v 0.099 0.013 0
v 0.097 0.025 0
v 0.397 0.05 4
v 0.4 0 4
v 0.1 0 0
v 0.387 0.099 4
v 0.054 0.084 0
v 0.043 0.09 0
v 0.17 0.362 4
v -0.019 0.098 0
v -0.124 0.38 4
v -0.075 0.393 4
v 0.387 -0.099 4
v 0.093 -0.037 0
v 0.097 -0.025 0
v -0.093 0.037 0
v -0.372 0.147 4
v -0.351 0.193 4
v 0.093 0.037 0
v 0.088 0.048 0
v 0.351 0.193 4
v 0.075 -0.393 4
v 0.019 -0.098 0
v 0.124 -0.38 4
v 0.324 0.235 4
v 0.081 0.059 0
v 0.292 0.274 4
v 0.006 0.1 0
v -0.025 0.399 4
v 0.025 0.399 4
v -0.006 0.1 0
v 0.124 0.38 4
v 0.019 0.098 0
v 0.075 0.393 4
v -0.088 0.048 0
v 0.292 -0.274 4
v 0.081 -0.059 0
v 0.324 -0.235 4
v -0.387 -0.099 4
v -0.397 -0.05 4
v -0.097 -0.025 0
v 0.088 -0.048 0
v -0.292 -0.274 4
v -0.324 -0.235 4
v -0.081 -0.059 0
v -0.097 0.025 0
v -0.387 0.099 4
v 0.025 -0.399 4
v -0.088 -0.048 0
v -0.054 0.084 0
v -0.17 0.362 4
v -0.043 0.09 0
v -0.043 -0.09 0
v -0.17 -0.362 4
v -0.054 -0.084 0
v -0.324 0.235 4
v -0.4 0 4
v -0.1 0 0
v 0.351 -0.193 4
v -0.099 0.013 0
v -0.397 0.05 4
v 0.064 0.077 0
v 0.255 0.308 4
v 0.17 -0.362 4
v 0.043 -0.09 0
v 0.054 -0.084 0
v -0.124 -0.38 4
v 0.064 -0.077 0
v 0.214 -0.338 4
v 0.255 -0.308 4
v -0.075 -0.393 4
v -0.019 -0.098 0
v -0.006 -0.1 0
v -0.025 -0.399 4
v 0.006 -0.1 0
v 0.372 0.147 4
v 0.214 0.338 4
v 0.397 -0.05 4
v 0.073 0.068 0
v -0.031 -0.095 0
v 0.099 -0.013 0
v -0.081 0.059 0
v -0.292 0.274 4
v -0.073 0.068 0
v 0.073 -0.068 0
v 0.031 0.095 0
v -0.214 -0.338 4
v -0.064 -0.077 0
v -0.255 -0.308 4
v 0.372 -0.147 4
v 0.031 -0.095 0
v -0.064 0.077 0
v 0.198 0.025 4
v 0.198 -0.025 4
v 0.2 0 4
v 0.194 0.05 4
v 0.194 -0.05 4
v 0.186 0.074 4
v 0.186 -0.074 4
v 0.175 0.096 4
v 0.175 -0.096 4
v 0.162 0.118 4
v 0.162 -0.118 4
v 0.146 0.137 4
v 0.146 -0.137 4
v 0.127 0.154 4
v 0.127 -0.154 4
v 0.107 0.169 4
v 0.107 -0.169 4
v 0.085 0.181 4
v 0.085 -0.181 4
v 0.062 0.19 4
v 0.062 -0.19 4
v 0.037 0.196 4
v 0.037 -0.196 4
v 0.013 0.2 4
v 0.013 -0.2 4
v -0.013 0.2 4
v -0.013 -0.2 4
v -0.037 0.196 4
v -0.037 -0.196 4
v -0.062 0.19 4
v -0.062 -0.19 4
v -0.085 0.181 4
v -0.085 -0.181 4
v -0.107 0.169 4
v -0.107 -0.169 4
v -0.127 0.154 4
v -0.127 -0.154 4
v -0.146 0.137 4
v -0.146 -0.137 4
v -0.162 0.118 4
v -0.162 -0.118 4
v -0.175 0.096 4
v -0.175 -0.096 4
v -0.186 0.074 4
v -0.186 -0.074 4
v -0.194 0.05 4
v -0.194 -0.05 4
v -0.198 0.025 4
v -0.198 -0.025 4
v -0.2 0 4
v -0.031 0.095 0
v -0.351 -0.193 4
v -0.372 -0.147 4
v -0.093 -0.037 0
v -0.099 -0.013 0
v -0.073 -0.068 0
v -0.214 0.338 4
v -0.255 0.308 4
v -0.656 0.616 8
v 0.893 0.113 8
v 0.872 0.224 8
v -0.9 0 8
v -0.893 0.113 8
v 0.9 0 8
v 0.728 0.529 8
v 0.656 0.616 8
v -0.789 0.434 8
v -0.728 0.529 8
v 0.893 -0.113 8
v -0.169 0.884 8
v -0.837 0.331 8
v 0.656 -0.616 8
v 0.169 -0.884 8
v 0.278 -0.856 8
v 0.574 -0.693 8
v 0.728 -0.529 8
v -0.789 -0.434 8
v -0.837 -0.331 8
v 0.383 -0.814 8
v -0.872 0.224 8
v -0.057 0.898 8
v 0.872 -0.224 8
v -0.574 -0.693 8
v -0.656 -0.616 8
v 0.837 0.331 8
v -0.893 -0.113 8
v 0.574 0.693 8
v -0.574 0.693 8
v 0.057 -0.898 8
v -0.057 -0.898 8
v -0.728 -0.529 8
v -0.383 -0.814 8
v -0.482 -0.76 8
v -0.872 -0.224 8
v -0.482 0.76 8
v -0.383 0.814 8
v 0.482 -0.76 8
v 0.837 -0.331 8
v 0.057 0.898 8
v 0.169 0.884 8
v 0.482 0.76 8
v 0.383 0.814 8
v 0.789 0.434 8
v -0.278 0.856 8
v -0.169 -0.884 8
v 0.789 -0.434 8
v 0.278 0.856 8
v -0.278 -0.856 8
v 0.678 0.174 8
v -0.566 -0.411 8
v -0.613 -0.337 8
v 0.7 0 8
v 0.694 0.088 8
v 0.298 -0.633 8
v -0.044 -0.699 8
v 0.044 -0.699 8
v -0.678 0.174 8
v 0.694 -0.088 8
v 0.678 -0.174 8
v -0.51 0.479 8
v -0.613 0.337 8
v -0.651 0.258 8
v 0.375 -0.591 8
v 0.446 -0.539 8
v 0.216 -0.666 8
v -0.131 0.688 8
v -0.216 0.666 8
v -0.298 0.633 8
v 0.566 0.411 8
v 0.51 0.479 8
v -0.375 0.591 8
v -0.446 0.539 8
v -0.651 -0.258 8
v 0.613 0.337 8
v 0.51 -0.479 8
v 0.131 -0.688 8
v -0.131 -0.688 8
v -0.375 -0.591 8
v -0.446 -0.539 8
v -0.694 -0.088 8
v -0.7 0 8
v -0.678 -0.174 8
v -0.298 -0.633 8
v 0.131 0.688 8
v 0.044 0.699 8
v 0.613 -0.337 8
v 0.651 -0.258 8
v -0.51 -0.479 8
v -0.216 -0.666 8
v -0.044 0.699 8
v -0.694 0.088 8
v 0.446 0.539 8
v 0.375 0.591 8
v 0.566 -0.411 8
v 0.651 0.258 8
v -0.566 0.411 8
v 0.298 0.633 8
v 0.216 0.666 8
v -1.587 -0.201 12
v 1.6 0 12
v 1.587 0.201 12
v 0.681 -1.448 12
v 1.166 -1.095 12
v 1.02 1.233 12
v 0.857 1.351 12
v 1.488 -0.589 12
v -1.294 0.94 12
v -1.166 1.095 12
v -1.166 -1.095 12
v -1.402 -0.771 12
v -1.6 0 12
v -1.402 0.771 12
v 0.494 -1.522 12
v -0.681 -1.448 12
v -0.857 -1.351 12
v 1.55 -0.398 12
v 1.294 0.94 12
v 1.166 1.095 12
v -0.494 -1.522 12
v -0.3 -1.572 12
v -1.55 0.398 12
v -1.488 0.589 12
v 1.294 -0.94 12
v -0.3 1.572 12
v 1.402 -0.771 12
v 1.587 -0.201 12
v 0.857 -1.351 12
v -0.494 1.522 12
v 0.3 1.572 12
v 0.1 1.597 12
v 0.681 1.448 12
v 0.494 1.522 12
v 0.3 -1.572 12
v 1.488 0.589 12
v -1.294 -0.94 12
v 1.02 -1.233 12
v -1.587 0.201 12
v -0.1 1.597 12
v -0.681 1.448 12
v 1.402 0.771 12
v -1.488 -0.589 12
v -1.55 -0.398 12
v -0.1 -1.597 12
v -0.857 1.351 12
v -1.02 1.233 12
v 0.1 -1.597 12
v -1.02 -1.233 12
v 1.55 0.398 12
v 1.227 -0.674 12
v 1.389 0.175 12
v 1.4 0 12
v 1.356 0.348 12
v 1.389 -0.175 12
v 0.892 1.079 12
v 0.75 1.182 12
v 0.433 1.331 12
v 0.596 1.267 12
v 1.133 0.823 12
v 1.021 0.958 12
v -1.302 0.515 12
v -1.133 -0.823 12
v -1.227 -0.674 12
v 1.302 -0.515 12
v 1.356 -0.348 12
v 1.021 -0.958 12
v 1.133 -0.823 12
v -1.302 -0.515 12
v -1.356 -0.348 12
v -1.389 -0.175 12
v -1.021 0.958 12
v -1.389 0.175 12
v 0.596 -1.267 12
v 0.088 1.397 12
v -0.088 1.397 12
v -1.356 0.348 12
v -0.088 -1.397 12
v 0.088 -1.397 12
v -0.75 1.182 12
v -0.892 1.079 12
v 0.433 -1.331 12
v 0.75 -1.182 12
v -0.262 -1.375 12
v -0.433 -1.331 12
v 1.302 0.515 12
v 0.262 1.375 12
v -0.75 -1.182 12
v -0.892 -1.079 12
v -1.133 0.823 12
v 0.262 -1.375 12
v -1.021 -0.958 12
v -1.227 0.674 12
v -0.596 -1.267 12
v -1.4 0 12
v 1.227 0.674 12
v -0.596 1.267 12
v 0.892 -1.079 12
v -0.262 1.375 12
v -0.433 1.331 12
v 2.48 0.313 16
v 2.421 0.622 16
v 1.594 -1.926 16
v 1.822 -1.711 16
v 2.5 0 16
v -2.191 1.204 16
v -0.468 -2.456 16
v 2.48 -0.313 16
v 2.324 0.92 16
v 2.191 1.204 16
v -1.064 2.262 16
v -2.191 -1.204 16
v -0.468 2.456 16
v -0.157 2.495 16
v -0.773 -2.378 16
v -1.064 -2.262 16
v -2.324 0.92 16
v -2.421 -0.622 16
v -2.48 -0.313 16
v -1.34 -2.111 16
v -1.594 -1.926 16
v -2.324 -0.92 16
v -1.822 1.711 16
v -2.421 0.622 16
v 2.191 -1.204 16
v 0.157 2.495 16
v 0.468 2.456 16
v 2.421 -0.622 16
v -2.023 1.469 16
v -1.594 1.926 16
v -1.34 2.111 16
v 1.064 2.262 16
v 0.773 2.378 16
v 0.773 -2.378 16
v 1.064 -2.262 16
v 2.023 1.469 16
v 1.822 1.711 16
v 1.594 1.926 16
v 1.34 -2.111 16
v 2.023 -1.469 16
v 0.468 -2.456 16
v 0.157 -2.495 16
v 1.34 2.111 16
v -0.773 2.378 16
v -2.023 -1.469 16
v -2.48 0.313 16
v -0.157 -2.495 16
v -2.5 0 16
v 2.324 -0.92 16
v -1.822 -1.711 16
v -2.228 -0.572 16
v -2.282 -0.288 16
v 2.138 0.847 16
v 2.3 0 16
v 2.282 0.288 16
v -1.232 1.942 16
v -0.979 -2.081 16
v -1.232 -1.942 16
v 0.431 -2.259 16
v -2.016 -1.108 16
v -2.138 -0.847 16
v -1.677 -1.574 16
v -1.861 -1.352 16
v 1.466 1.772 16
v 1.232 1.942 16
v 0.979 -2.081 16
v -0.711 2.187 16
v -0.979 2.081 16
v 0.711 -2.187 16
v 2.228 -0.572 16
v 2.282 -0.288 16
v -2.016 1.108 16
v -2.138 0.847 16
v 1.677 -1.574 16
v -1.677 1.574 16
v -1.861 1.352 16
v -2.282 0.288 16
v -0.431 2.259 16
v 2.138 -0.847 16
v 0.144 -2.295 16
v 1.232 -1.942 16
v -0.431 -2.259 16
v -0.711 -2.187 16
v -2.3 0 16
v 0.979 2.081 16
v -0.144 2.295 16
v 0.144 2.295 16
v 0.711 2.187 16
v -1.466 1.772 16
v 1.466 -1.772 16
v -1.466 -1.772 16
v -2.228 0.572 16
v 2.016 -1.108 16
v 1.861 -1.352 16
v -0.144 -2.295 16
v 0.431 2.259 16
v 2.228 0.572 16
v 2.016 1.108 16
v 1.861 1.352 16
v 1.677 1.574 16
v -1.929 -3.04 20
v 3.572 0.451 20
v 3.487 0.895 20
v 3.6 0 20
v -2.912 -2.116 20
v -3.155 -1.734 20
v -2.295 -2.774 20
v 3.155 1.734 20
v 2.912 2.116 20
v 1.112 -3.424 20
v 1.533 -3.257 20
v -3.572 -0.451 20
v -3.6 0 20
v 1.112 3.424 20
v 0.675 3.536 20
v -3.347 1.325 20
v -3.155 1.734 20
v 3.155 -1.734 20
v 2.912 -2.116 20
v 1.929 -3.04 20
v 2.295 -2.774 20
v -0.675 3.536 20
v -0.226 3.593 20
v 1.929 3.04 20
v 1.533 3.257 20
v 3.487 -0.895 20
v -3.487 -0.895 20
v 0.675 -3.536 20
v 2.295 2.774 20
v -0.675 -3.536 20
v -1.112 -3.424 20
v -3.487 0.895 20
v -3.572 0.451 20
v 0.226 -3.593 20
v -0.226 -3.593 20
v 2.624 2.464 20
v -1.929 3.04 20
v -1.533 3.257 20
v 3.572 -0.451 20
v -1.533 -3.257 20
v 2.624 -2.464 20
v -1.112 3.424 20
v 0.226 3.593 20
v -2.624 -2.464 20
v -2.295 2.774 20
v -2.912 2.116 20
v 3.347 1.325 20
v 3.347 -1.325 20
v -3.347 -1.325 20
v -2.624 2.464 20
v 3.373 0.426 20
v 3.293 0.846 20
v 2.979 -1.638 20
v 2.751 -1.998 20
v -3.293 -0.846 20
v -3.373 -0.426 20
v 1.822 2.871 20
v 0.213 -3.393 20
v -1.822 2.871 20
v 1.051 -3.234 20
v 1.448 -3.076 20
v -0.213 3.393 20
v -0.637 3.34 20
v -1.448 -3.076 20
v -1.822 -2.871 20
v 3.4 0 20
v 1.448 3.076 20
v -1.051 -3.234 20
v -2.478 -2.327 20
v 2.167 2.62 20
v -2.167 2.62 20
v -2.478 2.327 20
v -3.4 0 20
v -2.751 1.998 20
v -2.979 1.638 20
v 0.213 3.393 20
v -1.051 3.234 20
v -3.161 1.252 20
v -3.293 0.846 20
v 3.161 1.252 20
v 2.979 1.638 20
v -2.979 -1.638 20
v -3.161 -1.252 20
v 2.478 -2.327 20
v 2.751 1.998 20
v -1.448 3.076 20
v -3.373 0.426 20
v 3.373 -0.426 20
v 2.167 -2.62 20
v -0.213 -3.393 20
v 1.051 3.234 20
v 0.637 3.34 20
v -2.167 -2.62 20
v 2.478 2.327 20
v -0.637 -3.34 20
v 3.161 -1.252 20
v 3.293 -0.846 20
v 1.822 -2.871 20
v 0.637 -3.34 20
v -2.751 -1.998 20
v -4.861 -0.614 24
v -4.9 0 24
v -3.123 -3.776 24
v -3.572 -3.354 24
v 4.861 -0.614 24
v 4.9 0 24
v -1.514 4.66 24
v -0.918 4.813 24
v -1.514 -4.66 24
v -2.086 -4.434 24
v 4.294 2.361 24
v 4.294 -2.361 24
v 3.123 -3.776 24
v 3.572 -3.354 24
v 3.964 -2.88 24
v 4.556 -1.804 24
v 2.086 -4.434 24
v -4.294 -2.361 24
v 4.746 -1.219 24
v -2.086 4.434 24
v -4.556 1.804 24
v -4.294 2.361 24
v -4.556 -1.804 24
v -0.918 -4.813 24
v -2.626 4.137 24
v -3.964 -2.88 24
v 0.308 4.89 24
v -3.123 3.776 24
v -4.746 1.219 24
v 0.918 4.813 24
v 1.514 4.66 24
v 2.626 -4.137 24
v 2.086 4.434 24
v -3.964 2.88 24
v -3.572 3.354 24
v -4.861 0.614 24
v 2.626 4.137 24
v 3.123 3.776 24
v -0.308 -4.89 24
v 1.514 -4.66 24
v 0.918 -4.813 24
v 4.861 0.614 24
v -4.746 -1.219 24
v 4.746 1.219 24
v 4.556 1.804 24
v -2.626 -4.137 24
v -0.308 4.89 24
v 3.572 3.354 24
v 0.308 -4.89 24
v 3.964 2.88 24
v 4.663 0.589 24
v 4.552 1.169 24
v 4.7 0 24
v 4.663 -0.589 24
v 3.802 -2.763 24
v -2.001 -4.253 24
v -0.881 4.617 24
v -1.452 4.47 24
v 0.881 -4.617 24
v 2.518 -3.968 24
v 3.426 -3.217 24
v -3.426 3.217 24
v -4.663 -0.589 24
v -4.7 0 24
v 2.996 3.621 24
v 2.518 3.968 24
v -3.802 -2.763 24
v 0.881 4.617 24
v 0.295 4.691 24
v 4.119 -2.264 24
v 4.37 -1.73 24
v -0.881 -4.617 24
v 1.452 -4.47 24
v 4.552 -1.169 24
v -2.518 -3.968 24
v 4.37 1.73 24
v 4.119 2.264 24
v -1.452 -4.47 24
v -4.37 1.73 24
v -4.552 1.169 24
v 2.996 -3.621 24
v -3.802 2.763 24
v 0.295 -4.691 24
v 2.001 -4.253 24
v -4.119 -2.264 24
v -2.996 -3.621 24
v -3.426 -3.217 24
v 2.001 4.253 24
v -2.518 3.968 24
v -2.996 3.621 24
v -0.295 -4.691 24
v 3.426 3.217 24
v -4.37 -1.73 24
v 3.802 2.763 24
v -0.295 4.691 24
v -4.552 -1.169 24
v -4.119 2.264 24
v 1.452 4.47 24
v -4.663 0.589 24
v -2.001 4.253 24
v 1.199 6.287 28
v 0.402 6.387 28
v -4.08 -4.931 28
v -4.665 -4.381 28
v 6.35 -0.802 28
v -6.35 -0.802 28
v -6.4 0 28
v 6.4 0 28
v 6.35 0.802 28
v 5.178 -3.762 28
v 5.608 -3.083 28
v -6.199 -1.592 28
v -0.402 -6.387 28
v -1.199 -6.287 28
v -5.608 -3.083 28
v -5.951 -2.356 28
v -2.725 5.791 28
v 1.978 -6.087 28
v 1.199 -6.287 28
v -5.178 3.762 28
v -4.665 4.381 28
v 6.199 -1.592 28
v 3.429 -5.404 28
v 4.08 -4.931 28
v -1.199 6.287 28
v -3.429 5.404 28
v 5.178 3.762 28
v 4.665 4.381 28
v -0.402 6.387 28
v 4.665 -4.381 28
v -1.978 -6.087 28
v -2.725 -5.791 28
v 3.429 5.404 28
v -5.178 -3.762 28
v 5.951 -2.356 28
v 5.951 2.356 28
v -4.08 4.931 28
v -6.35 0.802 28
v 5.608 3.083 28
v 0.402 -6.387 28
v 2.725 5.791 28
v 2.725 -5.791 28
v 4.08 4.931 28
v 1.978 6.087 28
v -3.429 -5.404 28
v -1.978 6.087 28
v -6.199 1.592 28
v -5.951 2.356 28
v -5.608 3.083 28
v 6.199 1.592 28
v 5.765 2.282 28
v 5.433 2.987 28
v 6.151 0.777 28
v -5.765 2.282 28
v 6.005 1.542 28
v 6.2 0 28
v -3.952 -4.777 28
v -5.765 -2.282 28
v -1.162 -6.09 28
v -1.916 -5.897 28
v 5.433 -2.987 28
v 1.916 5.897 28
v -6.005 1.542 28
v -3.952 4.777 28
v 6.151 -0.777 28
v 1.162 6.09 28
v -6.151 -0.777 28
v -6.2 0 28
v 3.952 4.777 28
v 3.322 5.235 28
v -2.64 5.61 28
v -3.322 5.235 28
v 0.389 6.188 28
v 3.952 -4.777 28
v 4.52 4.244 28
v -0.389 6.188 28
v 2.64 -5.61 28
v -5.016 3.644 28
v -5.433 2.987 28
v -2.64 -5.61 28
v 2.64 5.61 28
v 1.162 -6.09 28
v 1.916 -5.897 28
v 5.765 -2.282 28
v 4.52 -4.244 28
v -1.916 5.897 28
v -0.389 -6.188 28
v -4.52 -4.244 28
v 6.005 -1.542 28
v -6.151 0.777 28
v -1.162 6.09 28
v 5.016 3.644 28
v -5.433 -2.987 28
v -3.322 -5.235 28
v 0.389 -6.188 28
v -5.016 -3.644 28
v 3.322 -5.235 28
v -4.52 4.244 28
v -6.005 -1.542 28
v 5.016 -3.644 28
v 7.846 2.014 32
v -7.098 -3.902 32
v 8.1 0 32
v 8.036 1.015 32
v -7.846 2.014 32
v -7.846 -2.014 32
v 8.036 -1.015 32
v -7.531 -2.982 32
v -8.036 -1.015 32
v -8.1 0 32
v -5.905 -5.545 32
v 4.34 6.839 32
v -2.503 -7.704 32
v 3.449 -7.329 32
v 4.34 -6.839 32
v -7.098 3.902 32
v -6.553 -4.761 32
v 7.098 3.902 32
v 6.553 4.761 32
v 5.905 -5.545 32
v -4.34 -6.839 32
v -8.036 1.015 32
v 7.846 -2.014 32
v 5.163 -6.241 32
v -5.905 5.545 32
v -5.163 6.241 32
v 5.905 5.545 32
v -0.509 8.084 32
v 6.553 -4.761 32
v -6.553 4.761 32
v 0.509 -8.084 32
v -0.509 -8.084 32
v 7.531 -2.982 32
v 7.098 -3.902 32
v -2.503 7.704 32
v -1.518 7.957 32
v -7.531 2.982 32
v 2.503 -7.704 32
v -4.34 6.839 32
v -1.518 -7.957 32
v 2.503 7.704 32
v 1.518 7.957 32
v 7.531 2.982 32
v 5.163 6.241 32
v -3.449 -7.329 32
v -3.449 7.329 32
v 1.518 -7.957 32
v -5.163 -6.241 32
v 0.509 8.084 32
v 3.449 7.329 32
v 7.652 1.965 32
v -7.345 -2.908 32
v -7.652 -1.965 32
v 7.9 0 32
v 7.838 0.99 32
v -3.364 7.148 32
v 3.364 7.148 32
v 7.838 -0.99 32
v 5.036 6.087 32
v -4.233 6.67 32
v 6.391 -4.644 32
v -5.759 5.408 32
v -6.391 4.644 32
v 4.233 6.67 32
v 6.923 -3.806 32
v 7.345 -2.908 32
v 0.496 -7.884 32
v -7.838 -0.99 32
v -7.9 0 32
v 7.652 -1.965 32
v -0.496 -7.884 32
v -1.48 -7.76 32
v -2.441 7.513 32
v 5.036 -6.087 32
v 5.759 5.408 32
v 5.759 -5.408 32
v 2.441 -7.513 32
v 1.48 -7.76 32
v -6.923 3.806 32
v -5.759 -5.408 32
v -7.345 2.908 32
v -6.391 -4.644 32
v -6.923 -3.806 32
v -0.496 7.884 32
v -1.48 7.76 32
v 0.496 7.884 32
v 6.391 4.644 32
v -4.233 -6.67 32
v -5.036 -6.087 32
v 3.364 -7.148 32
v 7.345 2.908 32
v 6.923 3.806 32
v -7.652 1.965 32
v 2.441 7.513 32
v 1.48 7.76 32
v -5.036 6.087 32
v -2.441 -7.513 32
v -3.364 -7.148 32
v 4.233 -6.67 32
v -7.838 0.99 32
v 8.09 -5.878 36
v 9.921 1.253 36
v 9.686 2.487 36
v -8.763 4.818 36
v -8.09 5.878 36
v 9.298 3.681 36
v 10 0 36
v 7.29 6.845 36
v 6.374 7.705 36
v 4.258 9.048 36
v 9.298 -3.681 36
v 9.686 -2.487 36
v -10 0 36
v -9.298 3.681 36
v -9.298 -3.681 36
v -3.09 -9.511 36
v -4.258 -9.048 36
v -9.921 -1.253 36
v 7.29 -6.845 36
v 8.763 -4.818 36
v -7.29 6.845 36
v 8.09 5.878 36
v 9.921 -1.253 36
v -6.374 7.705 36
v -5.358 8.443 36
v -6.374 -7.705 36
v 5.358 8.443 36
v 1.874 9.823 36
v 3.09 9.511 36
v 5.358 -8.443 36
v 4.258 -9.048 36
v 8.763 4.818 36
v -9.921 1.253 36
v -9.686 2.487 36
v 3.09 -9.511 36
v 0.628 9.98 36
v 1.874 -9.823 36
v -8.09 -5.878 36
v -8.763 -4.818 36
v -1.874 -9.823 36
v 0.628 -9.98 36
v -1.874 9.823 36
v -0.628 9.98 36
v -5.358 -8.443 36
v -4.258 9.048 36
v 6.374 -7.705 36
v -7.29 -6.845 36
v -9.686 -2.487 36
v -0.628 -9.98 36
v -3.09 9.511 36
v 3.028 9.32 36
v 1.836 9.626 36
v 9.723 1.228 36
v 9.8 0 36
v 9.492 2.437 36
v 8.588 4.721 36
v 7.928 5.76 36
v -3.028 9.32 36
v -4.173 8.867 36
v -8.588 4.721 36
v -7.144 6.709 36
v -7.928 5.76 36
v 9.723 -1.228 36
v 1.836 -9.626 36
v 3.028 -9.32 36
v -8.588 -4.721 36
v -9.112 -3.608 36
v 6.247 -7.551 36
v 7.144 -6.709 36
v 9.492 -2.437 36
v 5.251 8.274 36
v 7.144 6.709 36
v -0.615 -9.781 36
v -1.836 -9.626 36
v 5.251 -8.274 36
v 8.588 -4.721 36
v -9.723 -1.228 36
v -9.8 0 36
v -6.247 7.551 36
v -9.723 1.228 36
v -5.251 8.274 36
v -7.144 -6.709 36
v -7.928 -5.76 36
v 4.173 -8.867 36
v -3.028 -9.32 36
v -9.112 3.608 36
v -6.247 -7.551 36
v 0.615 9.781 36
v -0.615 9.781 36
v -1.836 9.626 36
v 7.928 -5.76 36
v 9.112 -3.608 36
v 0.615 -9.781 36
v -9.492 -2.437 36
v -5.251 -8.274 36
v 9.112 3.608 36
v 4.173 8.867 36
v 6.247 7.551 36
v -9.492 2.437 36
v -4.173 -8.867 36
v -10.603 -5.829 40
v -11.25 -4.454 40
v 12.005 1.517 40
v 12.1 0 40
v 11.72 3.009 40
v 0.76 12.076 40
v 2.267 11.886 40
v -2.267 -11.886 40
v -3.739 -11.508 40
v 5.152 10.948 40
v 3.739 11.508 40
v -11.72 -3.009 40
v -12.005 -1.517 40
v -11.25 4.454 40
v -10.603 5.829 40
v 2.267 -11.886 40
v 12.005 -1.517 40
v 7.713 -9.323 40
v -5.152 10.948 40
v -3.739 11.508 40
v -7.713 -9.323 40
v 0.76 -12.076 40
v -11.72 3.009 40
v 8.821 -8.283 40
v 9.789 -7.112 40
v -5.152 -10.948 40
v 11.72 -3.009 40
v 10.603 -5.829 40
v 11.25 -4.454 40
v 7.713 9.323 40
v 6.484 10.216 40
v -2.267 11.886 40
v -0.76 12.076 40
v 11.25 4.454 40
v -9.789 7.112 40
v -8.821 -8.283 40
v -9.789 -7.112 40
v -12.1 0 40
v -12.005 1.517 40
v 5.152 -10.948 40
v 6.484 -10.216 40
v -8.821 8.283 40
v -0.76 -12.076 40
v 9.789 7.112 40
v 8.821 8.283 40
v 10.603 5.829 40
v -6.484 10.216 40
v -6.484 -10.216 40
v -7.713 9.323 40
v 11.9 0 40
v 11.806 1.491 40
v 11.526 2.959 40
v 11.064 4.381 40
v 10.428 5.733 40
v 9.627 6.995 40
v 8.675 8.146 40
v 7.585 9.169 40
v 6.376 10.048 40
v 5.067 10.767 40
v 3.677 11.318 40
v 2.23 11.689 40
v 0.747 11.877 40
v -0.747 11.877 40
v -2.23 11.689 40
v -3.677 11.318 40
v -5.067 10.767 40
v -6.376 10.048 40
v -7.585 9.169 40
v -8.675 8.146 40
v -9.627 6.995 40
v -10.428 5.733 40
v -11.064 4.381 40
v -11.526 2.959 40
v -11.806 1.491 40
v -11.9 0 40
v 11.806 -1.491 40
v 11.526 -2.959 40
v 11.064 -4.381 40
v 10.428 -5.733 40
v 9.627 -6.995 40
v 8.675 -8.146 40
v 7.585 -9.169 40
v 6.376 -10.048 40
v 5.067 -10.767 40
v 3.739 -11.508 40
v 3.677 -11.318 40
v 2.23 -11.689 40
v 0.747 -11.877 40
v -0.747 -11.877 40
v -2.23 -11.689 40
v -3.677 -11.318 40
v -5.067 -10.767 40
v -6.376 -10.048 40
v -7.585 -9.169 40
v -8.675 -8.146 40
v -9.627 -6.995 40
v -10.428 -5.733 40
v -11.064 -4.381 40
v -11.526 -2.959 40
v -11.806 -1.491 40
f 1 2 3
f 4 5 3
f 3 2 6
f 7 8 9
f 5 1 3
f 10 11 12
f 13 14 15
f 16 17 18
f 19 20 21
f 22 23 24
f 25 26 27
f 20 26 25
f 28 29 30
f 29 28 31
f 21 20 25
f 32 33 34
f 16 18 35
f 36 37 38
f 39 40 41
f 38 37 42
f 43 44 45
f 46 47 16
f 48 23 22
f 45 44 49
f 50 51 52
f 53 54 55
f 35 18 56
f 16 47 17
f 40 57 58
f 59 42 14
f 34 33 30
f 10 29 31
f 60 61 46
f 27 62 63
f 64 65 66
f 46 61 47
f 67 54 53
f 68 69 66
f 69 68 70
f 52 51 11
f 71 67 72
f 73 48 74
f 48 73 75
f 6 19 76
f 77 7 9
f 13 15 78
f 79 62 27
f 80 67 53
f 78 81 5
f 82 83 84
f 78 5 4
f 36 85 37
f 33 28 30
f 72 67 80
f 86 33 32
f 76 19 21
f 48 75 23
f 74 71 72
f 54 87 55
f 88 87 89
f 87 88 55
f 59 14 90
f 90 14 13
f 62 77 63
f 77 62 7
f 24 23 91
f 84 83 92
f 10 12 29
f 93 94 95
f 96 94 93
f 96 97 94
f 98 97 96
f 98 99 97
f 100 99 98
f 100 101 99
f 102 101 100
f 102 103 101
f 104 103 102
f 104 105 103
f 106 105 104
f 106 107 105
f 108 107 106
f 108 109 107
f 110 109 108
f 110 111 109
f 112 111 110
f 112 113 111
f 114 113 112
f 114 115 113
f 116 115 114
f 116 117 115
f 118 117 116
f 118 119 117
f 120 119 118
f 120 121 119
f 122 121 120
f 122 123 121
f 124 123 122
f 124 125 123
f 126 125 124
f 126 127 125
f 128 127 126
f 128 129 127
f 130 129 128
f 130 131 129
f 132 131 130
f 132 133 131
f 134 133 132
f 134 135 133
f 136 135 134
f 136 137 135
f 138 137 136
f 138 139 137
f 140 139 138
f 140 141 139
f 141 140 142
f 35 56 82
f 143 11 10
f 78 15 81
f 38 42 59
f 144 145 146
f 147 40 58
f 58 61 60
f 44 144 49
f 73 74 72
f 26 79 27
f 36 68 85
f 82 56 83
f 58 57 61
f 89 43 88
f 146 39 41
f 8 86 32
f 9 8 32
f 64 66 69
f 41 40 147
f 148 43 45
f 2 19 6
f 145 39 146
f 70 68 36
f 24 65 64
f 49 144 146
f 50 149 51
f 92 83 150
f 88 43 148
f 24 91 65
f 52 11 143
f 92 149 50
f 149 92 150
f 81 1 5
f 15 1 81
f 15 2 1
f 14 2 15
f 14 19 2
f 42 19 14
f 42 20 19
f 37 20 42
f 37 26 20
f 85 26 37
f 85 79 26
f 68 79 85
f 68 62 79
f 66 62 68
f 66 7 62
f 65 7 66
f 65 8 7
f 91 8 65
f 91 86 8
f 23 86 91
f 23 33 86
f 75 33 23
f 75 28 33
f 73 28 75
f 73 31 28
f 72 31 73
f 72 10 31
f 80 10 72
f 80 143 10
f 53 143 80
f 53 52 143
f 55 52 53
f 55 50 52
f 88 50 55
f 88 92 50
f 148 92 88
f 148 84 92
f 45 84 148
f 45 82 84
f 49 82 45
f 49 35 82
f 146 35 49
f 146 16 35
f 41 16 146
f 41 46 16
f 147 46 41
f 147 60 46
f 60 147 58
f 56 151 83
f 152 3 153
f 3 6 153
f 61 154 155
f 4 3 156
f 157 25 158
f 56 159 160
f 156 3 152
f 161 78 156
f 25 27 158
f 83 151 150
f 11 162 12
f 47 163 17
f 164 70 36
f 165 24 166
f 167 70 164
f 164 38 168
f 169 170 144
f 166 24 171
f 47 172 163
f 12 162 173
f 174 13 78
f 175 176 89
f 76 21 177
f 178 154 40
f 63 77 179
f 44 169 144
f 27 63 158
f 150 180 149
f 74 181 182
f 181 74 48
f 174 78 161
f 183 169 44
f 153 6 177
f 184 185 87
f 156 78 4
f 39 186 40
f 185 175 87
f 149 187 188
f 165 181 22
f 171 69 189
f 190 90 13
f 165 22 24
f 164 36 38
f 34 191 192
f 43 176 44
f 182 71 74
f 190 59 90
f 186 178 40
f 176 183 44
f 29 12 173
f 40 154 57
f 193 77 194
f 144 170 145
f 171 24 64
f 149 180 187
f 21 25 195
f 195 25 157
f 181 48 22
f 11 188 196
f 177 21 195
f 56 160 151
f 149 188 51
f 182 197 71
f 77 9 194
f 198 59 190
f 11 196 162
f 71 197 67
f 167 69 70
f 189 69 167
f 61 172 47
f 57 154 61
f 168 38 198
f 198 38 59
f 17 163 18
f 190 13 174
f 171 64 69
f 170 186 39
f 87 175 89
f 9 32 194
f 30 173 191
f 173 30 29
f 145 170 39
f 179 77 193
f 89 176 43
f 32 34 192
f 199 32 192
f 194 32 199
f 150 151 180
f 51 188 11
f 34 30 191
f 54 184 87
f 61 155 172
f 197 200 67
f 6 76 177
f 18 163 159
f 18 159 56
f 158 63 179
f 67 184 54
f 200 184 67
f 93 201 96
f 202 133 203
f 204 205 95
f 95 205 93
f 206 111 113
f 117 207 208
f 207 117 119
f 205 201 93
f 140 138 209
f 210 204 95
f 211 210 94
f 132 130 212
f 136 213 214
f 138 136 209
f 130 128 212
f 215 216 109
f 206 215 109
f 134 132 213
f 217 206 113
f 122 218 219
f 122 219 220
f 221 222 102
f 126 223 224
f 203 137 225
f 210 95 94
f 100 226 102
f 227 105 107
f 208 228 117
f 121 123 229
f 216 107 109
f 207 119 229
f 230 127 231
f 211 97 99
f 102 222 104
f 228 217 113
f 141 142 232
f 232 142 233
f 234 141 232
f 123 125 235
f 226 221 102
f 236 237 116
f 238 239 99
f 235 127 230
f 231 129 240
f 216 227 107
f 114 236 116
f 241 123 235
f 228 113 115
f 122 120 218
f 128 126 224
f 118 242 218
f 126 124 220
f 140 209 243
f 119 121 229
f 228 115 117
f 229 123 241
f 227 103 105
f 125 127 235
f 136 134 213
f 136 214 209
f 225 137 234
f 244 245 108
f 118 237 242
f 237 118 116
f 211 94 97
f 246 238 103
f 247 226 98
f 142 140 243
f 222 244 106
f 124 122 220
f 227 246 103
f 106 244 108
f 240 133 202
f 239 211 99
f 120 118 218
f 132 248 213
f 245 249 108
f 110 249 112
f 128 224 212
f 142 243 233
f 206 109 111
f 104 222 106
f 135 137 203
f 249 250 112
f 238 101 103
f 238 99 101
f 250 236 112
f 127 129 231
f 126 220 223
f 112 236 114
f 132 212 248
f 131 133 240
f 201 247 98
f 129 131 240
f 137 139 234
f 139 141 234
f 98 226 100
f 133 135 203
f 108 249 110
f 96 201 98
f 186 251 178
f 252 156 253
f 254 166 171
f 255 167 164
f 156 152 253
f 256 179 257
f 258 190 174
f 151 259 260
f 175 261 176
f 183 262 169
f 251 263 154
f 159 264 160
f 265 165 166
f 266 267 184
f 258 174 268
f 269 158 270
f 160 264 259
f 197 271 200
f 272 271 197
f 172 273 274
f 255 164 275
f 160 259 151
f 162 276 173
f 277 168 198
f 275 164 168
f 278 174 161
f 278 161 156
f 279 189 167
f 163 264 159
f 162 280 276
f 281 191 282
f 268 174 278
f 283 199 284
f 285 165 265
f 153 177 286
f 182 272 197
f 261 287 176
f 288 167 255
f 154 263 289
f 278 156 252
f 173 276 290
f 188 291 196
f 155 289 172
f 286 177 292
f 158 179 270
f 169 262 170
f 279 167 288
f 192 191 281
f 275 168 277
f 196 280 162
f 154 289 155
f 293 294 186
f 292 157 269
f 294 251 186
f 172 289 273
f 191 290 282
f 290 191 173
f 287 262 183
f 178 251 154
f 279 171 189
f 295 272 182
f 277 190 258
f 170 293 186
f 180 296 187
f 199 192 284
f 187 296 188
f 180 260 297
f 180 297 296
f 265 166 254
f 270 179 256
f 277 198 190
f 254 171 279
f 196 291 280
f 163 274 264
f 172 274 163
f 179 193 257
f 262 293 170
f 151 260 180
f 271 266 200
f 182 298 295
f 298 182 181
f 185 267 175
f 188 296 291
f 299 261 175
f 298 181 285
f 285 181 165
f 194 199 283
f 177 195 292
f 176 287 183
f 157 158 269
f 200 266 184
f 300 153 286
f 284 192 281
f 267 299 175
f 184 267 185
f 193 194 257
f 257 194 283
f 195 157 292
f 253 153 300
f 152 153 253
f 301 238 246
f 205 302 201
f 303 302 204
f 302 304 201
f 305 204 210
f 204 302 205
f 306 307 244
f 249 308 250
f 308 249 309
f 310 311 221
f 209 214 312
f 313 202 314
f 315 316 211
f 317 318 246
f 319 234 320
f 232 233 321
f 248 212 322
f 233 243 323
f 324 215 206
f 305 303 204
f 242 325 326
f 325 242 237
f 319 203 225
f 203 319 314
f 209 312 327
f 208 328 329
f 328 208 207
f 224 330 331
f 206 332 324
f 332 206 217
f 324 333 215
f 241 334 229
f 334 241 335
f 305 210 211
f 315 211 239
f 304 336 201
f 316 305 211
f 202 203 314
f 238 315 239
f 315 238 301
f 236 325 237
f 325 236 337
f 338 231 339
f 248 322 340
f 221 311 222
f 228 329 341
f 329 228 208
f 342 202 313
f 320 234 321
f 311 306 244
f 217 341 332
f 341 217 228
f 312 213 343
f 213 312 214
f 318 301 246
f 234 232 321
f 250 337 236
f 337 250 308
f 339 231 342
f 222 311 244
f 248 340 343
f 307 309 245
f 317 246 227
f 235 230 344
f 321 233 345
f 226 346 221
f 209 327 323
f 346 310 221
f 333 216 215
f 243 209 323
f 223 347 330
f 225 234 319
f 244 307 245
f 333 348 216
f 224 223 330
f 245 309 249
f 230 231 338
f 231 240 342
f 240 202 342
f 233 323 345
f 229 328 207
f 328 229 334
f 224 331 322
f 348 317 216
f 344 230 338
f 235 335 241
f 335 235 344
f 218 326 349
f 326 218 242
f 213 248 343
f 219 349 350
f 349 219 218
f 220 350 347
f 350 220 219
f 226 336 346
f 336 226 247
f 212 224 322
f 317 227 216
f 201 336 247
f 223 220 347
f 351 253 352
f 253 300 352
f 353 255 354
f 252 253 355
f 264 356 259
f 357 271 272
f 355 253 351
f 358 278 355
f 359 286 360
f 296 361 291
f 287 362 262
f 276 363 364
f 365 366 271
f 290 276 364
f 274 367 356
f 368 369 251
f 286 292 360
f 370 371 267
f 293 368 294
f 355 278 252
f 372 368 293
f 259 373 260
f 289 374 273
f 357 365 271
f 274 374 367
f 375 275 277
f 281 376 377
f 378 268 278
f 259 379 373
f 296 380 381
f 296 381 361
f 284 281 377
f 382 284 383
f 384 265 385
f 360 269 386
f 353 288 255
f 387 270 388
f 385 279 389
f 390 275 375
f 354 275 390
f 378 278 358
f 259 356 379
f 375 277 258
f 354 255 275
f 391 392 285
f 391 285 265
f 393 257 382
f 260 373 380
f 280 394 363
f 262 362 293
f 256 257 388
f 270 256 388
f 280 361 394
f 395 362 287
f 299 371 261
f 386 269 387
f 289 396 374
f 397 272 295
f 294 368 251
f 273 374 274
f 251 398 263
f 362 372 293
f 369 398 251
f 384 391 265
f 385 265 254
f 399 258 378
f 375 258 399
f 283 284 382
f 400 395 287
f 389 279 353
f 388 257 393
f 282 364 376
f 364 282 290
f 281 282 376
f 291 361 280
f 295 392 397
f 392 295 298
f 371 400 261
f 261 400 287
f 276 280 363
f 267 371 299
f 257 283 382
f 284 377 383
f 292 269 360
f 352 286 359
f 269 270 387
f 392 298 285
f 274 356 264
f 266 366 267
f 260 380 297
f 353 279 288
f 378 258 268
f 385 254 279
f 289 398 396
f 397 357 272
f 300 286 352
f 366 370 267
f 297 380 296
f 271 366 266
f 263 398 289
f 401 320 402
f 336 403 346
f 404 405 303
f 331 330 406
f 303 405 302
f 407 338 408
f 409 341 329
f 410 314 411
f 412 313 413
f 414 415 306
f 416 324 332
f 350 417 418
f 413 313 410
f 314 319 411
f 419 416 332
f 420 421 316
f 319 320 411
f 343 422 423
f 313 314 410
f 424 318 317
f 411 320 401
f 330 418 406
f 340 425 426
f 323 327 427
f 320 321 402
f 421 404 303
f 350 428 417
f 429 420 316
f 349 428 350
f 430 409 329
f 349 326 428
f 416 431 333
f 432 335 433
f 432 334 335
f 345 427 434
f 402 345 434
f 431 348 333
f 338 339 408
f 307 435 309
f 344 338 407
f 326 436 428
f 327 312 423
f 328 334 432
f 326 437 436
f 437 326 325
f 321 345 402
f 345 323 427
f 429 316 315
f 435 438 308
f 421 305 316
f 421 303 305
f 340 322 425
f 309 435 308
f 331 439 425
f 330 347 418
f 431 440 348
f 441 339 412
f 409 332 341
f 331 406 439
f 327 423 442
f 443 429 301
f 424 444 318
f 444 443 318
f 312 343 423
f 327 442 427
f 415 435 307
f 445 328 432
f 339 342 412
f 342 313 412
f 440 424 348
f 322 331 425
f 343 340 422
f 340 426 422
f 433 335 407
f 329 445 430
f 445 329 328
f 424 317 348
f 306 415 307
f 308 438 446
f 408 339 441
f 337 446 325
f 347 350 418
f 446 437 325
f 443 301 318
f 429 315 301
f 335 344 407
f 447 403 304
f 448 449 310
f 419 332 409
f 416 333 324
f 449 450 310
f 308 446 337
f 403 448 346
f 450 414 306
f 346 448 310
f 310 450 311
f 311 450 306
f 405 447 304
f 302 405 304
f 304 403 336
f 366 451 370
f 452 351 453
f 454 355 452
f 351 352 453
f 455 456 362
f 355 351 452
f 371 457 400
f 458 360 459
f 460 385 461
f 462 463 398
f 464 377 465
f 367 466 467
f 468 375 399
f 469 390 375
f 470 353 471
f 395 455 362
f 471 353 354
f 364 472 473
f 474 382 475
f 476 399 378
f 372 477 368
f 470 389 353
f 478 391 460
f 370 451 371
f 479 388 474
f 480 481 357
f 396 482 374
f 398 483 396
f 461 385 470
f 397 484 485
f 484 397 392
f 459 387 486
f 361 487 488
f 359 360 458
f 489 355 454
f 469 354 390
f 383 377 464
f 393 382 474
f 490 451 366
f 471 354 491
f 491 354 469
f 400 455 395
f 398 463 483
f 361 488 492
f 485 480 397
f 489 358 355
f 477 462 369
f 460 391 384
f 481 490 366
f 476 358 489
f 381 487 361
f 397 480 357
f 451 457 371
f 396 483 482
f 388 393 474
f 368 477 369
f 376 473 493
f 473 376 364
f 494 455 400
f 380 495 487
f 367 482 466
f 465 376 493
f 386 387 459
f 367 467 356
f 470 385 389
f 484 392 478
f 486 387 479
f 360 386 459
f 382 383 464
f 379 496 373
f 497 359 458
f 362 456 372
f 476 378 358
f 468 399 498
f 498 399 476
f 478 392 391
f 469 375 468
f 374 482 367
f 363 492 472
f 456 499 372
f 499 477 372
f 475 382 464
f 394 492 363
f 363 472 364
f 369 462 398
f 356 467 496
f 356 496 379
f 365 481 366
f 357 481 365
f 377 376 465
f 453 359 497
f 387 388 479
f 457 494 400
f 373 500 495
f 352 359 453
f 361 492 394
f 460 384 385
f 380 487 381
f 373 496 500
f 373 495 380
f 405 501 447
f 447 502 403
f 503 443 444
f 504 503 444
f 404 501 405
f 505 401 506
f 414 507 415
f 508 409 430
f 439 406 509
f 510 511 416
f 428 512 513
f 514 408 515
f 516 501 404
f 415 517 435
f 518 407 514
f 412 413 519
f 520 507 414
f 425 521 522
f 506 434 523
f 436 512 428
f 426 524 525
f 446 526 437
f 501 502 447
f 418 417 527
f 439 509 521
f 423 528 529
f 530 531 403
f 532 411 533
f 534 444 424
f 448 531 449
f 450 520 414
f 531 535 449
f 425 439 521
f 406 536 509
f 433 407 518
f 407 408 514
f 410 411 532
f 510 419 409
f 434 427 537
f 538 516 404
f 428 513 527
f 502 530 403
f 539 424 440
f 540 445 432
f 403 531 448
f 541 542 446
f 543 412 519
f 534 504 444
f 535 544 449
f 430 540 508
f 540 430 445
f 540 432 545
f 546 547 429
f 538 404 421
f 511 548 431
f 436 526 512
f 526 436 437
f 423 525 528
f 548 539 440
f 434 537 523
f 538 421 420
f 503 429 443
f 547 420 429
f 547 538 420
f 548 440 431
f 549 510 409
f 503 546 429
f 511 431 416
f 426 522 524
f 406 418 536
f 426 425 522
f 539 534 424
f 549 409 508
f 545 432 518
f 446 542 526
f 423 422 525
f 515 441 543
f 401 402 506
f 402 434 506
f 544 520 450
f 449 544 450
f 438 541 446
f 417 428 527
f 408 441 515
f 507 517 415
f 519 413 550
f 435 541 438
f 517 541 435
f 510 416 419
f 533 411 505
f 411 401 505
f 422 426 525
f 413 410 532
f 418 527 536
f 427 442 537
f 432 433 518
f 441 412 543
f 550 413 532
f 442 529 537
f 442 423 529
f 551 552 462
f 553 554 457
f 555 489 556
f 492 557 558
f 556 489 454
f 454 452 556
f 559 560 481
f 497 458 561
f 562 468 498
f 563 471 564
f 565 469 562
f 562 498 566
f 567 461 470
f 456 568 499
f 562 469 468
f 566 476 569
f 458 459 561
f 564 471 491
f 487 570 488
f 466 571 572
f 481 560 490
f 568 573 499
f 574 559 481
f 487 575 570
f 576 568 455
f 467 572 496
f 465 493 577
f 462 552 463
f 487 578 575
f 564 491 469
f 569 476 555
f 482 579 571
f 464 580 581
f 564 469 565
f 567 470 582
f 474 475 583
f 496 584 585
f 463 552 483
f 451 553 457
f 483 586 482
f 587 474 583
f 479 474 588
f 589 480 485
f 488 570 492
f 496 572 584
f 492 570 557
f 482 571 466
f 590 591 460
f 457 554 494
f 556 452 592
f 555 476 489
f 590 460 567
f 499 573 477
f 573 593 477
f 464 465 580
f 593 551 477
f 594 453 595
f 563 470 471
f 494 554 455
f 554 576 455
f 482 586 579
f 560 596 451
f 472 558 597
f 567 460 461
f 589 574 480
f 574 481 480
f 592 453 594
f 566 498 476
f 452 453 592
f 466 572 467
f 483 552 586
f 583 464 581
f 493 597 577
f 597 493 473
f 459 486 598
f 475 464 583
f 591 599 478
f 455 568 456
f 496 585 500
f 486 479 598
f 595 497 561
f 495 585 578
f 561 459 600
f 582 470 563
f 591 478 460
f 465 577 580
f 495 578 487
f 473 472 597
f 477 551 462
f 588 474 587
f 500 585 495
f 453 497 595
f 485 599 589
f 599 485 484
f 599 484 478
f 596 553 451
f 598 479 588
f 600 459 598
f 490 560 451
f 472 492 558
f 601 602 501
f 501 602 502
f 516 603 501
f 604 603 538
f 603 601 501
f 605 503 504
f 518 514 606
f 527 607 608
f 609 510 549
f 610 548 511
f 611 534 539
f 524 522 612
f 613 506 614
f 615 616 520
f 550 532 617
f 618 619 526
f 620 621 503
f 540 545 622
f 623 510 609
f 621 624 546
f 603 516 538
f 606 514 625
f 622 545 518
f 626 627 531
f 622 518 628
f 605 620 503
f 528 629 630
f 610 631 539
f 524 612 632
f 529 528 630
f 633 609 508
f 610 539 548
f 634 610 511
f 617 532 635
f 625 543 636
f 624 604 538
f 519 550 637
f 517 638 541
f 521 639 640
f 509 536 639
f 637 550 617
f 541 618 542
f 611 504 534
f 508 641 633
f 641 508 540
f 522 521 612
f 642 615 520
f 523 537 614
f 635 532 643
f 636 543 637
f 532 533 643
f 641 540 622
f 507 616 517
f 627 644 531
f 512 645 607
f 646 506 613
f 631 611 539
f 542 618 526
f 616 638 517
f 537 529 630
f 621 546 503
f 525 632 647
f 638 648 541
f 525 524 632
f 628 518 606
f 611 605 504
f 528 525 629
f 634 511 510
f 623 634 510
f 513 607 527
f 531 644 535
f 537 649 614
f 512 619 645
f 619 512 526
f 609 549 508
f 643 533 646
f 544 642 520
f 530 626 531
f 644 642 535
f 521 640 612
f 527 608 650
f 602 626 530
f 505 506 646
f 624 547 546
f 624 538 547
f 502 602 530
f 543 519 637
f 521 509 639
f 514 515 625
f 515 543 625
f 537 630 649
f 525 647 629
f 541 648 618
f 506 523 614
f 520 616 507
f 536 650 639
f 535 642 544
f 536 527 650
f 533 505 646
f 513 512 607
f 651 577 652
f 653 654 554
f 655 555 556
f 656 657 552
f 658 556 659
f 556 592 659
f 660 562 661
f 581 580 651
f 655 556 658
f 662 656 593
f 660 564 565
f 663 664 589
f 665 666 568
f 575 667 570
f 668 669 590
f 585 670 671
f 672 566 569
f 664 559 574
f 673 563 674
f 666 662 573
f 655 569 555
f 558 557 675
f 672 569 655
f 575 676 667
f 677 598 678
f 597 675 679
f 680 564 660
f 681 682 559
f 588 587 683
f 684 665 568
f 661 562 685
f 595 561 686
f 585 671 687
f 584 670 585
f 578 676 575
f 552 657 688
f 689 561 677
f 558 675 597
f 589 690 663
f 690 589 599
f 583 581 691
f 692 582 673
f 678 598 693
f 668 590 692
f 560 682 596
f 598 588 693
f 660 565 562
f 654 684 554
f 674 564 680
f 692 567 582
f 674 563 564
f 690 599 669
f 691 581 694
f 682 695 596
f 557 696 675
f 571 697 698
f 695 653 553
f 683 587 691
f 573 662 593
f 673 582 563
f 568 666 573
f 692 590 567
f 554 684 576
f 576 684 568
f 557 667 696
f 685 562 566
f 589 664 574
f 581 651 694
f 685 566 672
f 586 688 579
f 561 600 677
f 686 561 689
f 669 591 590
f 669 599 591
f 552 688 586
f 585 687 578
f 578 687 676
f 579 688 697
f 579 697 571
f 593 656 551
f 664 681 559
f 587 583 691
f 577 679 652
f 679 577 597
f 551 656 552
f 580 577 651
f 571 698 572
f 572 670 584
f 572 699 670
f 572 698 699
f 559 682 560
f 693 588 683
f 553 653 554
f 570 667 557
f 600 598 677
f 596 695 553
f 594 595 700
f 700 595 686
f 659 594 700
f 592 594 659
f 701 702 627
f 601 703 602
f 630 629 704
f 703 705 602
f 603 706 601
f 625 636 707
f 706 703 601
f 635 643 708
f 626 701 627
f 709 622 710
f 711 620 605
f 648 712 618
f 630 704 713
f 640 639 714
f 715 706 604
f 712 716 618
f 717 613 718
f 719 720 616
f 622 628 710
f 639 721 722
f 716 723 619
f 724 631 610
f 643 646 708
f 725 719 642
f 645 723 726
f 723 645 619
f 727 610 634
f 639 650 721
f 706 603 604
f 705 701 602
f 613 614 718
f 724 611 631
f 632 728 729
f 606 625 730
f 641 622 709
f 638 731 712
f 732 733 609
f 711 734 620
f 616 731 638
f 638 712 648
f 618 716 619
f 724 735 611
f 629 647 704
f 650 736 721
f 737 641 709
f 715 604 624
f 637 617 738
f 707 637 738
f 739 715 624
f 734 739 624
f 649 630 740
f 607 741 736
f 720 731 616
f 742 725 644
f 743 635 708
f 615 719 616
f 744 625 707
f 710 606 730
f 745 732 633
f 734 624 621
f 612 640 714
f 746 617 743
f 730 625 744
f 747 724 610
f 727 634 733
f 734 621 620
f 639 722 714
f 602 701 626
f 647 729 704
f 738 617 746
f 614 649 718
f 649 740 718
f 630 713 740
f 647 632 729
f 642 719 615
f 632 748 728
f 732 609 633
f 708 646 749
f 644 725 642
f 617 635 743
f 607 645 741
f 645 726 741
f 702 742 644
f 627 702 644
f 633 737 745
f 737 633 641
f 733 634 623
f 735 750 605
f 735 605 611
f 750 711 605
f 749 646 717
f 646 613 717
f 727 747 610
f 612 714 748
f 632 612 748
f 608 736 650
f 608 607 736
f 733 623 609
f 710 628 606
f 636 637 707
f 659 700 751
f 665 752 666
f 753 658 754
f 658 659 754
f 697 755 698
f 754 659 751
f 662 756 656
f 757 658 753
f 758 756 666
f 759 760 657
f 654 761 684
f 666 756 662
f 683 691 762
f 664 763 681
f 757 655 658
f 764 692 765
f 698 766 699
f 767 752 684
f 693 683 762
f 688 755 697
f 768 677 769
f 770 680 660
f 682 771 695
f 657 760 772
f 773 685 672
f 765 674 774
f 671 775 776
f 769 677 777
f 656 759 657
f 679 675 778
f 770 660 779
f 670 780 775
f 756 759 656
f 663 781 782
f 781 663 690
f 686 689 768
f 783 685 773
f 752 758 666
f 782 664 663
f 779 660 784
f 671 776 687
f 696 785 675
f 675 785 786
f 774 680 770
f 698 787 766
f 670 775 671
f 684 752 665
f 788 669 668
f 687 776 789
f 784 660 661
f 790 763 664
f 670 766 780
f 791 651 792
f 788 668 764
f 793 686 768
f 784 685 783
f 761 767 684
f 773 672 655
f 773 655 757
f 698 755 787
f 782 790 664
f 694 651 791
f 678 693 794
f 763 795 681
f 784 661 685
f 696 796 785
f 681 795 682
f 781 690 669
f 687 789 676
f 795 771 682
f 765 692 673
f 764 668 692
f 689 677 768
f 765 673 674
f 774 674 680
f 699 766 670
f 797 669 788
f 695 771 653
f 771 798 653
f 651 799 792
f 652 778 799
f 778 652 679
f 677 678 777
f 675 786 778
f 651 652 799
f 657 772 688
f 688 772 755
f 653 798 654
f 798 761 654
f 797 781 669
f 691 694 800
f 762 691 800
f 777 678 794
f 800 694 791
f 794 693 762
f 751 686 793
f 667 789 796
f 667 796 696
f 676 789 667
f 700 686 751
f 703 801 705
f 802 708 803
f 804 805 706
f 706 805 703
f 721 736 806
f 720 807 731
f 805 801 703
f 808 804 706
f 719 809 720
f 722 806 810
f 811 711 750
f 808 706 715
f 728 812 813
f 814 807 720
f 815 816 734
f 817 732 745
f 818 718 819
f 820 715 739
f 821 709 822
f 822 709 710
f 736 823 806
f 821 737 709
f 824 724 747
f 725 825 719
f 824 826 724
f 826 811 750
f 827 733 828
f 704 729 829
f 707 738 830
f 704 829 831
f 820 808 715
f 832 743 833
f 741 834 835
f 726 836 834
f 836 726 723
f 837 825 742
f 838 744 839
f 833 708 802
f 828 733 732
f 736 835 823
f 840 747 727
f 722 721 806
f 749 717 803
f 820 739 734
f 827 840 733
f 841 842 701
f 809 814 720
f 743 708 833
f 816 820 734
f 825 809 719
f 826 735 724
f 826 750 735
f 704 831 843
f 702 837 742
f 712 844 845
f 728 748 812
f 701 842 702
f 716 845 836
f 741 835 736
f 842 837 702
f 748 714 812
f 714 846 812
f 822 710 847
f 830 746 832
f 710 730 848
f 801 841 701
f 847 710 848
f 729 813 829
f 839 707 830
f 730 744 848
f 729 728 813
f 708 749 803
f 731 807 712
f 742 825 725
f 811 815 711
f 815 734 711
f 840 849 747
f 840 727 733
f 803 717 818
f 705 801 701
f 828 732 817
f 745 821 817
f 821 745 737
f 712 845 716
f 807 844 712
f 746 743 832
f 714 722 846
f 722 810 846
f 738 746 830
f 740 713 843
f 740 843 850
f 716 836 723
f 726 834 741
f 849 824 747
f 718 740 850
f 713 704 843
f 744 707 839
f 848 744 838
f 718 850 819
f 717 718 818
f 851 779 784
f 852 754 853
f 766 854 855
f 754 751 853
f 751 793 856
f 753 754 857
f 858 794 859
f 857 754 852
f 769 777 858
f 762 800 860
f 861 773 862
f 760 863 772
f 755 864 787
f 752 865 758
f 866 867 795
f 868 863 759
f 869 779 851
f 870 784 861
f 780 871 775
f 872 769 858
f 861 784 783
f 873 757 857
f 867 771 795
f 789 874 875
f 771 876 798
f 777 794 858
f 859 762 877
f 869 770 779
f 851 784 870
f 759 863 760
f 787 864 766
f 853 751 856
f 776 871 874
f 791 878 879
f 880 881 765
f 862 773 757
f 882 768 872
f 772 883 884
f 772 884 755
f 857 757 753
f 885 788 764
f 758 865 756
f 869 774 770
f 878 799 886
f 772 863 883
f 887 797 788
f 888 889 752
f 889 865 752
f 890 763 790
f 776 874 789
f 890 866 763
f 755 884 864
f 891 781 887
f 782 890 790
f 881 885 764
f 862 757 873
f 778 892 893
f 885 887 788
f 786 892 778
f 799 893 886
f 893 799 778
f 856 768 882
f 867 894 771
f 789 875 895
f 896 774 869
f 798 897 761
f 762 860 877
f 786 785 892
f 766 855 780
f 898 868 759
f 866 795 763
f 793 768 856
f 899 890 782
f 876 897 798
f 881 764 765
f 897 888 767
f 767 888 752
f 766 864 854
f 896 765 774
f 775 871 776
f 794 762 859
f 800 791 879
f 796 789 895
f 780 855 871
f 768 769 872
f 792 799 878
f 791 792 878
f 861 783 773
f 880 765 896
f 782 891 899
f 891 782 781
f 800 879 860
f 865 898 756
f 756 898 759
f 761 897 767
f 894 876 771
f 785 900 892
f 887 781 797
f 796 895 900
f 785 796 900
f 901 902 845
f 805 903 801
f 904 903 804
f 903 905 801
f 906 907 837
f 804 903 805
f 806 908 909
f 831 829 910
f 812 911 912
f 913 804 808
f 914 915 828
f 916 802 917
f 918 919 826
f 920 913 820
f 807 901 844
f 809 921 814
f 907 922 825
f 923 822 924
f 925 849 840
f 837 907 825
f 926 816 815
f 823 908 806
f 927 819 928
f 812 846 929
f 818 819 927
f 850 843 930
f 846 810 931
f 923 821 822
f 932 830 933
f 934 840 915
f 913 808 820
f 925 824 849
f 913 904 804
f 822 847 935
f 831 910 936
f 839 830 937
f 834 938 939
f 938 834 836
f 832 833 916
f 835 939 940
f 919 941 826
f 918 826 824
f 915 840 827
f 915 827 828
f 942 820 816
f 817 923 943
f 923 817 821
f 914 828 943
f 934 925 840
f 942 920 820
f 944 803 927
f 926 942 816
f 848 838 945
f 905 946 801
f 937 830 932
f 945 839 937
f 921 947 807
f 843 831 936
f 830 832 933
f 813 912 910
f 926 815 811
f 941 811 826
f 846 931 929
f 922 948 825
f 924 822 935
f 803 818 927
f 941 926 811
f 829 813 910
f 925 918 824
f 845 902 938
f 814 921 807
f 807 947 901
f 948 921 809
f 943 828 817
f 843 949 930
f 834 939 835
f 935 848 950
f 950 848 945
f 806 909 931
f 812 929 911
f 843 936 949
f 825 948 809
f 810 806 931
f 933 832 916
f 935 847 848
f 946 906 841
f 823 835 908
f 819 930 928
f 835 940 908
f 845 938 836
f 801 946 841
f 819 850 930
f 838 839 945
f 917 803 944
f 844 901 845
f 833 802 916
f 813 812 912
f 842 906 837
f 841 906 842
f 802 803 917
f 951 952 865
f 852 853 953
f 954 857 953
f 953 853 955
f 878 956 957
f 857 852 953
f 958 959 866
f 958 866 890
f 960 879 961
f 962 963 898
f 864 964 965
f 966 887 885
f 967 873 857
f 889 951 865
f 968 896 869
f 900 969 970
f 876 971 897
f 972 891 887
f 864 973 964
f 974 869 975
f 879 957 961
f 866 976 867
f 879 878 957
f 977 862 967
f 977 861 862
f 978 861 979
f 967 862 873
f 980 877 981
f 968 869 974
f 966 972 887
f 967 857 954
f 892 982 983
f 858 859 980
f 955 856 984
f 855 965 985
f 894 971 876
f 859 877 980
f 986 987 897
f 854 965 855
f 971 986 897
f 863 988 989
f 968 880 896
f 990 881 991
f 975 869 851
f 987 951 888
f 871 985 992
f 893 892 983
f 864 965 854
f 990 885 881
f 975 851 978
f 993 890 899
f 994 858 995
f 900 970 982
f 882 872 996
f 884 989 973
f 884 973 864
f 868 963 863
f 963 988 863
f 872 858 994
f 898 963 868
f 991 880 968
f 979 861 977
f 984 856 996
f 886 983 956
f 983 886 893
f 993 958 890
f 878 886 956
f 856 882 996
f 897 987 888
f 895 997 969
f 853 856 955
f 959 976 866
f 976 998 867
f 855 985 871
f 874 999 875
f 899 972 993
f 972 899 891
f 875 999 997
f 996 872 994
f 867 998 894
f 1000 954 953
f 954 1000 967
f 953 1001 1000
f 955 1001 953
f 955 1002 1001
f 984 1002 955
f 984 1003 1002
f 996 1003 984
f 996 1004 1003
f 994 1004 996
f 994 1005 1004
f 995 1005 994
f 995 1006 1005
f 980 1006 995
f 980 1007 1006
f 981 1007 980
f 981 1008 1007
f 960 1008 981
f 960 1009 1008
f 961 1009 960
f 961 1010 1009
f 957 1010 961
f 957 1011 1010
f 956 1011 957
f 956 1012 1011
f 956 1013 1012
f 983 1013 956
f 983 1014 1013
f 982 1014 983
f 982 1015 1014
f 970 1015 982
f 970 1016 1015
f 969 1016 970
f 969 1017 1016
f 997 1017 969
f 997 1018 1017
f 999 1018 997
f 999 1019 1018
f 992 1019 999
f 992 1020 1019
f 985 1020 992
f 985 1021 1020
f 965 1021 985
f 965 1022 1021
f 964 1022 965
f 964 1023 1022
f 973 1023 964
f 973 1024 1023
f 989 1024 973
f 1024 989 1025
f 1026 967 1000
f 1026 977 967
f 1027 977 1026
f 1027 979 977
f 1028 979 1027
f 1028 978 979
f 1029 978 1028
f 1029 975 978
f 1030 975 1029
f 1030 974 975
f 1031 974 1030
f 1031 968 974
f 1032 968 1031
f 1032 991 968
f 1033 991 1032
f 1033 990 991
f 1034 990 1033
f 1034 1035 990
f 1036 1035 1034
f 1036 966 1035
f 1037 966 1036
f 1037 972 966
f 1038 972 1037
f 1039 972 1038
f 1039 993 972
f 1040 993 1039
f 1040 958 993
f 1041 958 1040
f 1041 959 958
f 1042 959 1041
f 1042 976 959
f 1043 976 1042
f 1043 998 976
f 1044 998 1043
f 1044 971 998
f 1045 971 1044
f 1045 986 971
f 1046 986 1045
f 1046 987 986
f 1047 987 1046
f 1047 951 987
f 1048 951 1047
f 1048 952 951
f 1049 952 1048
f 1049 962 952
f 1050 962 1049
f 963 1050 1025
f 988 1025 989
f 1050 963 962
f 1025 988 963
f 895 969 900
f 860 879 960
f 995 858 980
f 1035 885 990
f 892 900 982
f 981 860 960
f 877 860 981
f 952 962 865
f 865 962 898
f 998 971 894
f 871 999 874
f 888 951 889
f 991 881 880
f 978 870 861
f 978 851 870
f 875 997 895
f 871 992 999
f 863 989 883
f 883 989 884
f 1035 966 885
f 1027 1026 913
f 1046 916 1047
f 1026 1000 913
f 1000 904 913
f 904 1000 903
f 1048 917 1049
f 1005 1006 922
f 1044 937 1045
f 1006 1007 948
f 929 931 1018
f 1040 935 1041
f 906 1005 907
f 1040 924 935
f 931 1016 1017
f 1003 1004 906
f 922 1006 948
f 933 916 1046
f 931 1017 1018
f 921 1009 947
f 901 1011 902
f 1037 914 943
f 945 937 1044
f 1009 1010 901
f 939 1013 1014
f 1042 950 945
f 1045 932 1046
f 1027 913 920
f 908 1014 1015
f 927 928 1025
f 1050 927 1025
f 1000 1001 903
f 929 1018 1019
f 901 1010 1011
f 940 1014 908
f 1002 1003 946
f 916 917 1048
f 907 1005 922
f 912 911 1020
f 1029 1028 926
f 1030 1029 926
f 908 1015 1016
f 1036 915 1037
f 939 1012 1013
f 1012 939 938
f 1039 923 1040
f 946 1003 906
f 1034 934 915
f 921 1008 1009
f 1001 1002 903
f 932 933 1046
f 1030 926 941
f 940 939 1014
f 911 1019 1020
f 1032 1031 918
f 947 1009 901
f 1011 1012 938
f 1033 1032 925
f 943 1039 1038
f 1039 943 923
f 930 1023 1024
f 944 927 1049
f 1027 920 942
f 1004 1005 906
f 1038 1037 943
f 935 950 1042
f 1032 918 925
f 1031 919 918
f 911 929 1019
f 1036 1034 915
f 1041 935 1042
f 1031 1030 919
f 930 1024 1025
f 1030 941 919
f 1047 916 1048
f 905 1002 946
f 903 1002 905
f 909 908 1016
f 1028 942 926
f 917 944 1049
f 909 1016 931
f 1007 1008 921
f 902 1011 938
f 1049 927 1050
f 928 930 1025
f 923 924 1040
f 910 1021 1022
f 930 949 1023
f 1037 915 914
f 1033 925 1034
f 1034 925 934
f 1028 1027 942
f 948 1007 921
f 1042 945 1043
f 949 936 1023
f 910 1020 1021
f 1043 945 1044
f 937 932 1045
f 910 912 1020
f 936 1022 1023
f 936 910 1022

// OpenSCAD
      difference () {
        
    translate([0, 0, 0.0])
      linear_extrude(height = 4.0, center = false, convexity = 10, twist = 0, $fn = 50, scale = 4.0)
      circle(r = 0.1);
  
        
    translate([0, 0, 0.0])
      linear_extrude(height = 4.0, center = false, convexity = 10, twist = 0, $fn = 50, scale = -2.0)
      circle(r = -0.1);
  
      }
    
      difference () {
        
    translate([0, 0, 4.0])
      linear_extrude(height = 4.0, center = false, convexity = 10, twist = 0, $fn = 50, scale = 2.25)
      circle(r = 0.4);
  
        
    translate([0, 0, 4.0])
      linear_extrude(height = 4.0, center = false, convexity = 10, twist = 0, $fn = 50, scale = 3.4999999999999996)
      circle(r = 0.2);
  
      }
    
      difference () {
        
    translate([0, 0, 8.0])
      linear_extrude(height = 4.0, center = false, convexity = 10, twist = 0, $fn = 50, scale = 1.777777777777778)
      circle(r = 0.9);
  
        
    translate([0, 0, 8.0])
      linear_extrude(height = 4.0, center = false, convexity = 10, twist = 0, $fn = 50, scale = 2.0000000000000004)
      circle(r = 0.7);
  
      }
    
      difference () {
        
    translate([0, 0, 12.0])
      linear_extrude(height = 4.0, center = false, convexity = 10, twist = 0, $fn = 50, scale = 1.5625)
      circle(r = 1.6);
  
        
    translate([0, 0, 12.0])
      linear_extrude(height = 4.0, center = false, convexity = 10, twist = 0, $fn = 50, scale = 1.6428571428571426)
      circle(r = 1.4000000000000001);
  
      }
    
      difference () {
        
    translate([0, 0, 16.0])
      linear_extrude(height = 4.0, center = false, convexity = 10, twist = 0, $fn = 50, scale = 1.44)
      circle(r = 2.5);
  
        
    translate([0, 0, 16.0])
      linear_extrude(height = 4.0, center = false, convexity = 10, twist = 0, $fn = 50, scale = 1.4782608695652175)
      circle(r = 2.3);
  
      }
    
      difference () {
        
    translate([0, 0, 20.0])
      linear_extrude(height = 4.0, center = false, convexity = 10, twist = 0, $fn = 50, scale = 1.3611111111111112)
      circle(r = 3.6);
  
        
    translate([0, 0, 20.0])
      linear_extrude(height = 4.0, center = false, convexity = 10, twist = 0, $fn = 50, scale = 1.3823529411764708)
      circle(r = 3.4);
  
      }
    
      difference () {
        
    translate([0, 0, 24.0])
      linear_extrude(height = 4.0, center = false, convexity = 10, twist = 0, $fn = 50, scale = 1.3061224489795917)
      circle(r = 4.9);
  
        
    translate([0, 0, 24.0])
      linear_extrude(height = 4.0, center = false, convexity = 10, twist = 0, $fn = 50, scale = 1.3191489361702127)
      circle(r = 4.7);
  
      }
    
      difference () {
        
    translate([0, 0, 28.0])
      linear_extrude(height = 4.0, center = false, convexity = 10, twist = 0, $fn = 50, scale = 1.2656249999999998)
      circle(r = 6.4);
  
        
    translate([0, 0, 28.0])
      linear_extrude(height = 4.0, center = false, convexity = 10, twist = 0, $fn = 50, scale = 1.2741935483870968)
      circle(r = 6.2);
  
      }
    
      difference () {
        
    translate([0, 0, 32.0])
      linear_extrude(height = 4.0, center = false, convexity = 10, twist = 0, $fn = 50, scale = 1.234567901234568)
      circle(r = 8.1);
  
        
    translate([0, 0, 32.0])
      linear_extrude(height = 4.0, center = false, convexity = 10, twist = 0, $fn = 50, scale = 1.2405063291139242)
      circle(r = 7.8999999999999995);
  
      }
    
      difference () {
        
    translate([0, 0, 36.0])
      linear_extrude(height = 4.0, center = false, convexity = 10, twist = 0, $fn = 50, scale = 1.21)
      circle(r = 10.0);
  
        
    translate([0, 0, 36.0])
      linear_extrude(height = 4.0, center = false, convexity = 10, twist = 0, $fn = 50, scale = 1.2142857142857142)
      circle(r = 9.8);
  
      }
    
